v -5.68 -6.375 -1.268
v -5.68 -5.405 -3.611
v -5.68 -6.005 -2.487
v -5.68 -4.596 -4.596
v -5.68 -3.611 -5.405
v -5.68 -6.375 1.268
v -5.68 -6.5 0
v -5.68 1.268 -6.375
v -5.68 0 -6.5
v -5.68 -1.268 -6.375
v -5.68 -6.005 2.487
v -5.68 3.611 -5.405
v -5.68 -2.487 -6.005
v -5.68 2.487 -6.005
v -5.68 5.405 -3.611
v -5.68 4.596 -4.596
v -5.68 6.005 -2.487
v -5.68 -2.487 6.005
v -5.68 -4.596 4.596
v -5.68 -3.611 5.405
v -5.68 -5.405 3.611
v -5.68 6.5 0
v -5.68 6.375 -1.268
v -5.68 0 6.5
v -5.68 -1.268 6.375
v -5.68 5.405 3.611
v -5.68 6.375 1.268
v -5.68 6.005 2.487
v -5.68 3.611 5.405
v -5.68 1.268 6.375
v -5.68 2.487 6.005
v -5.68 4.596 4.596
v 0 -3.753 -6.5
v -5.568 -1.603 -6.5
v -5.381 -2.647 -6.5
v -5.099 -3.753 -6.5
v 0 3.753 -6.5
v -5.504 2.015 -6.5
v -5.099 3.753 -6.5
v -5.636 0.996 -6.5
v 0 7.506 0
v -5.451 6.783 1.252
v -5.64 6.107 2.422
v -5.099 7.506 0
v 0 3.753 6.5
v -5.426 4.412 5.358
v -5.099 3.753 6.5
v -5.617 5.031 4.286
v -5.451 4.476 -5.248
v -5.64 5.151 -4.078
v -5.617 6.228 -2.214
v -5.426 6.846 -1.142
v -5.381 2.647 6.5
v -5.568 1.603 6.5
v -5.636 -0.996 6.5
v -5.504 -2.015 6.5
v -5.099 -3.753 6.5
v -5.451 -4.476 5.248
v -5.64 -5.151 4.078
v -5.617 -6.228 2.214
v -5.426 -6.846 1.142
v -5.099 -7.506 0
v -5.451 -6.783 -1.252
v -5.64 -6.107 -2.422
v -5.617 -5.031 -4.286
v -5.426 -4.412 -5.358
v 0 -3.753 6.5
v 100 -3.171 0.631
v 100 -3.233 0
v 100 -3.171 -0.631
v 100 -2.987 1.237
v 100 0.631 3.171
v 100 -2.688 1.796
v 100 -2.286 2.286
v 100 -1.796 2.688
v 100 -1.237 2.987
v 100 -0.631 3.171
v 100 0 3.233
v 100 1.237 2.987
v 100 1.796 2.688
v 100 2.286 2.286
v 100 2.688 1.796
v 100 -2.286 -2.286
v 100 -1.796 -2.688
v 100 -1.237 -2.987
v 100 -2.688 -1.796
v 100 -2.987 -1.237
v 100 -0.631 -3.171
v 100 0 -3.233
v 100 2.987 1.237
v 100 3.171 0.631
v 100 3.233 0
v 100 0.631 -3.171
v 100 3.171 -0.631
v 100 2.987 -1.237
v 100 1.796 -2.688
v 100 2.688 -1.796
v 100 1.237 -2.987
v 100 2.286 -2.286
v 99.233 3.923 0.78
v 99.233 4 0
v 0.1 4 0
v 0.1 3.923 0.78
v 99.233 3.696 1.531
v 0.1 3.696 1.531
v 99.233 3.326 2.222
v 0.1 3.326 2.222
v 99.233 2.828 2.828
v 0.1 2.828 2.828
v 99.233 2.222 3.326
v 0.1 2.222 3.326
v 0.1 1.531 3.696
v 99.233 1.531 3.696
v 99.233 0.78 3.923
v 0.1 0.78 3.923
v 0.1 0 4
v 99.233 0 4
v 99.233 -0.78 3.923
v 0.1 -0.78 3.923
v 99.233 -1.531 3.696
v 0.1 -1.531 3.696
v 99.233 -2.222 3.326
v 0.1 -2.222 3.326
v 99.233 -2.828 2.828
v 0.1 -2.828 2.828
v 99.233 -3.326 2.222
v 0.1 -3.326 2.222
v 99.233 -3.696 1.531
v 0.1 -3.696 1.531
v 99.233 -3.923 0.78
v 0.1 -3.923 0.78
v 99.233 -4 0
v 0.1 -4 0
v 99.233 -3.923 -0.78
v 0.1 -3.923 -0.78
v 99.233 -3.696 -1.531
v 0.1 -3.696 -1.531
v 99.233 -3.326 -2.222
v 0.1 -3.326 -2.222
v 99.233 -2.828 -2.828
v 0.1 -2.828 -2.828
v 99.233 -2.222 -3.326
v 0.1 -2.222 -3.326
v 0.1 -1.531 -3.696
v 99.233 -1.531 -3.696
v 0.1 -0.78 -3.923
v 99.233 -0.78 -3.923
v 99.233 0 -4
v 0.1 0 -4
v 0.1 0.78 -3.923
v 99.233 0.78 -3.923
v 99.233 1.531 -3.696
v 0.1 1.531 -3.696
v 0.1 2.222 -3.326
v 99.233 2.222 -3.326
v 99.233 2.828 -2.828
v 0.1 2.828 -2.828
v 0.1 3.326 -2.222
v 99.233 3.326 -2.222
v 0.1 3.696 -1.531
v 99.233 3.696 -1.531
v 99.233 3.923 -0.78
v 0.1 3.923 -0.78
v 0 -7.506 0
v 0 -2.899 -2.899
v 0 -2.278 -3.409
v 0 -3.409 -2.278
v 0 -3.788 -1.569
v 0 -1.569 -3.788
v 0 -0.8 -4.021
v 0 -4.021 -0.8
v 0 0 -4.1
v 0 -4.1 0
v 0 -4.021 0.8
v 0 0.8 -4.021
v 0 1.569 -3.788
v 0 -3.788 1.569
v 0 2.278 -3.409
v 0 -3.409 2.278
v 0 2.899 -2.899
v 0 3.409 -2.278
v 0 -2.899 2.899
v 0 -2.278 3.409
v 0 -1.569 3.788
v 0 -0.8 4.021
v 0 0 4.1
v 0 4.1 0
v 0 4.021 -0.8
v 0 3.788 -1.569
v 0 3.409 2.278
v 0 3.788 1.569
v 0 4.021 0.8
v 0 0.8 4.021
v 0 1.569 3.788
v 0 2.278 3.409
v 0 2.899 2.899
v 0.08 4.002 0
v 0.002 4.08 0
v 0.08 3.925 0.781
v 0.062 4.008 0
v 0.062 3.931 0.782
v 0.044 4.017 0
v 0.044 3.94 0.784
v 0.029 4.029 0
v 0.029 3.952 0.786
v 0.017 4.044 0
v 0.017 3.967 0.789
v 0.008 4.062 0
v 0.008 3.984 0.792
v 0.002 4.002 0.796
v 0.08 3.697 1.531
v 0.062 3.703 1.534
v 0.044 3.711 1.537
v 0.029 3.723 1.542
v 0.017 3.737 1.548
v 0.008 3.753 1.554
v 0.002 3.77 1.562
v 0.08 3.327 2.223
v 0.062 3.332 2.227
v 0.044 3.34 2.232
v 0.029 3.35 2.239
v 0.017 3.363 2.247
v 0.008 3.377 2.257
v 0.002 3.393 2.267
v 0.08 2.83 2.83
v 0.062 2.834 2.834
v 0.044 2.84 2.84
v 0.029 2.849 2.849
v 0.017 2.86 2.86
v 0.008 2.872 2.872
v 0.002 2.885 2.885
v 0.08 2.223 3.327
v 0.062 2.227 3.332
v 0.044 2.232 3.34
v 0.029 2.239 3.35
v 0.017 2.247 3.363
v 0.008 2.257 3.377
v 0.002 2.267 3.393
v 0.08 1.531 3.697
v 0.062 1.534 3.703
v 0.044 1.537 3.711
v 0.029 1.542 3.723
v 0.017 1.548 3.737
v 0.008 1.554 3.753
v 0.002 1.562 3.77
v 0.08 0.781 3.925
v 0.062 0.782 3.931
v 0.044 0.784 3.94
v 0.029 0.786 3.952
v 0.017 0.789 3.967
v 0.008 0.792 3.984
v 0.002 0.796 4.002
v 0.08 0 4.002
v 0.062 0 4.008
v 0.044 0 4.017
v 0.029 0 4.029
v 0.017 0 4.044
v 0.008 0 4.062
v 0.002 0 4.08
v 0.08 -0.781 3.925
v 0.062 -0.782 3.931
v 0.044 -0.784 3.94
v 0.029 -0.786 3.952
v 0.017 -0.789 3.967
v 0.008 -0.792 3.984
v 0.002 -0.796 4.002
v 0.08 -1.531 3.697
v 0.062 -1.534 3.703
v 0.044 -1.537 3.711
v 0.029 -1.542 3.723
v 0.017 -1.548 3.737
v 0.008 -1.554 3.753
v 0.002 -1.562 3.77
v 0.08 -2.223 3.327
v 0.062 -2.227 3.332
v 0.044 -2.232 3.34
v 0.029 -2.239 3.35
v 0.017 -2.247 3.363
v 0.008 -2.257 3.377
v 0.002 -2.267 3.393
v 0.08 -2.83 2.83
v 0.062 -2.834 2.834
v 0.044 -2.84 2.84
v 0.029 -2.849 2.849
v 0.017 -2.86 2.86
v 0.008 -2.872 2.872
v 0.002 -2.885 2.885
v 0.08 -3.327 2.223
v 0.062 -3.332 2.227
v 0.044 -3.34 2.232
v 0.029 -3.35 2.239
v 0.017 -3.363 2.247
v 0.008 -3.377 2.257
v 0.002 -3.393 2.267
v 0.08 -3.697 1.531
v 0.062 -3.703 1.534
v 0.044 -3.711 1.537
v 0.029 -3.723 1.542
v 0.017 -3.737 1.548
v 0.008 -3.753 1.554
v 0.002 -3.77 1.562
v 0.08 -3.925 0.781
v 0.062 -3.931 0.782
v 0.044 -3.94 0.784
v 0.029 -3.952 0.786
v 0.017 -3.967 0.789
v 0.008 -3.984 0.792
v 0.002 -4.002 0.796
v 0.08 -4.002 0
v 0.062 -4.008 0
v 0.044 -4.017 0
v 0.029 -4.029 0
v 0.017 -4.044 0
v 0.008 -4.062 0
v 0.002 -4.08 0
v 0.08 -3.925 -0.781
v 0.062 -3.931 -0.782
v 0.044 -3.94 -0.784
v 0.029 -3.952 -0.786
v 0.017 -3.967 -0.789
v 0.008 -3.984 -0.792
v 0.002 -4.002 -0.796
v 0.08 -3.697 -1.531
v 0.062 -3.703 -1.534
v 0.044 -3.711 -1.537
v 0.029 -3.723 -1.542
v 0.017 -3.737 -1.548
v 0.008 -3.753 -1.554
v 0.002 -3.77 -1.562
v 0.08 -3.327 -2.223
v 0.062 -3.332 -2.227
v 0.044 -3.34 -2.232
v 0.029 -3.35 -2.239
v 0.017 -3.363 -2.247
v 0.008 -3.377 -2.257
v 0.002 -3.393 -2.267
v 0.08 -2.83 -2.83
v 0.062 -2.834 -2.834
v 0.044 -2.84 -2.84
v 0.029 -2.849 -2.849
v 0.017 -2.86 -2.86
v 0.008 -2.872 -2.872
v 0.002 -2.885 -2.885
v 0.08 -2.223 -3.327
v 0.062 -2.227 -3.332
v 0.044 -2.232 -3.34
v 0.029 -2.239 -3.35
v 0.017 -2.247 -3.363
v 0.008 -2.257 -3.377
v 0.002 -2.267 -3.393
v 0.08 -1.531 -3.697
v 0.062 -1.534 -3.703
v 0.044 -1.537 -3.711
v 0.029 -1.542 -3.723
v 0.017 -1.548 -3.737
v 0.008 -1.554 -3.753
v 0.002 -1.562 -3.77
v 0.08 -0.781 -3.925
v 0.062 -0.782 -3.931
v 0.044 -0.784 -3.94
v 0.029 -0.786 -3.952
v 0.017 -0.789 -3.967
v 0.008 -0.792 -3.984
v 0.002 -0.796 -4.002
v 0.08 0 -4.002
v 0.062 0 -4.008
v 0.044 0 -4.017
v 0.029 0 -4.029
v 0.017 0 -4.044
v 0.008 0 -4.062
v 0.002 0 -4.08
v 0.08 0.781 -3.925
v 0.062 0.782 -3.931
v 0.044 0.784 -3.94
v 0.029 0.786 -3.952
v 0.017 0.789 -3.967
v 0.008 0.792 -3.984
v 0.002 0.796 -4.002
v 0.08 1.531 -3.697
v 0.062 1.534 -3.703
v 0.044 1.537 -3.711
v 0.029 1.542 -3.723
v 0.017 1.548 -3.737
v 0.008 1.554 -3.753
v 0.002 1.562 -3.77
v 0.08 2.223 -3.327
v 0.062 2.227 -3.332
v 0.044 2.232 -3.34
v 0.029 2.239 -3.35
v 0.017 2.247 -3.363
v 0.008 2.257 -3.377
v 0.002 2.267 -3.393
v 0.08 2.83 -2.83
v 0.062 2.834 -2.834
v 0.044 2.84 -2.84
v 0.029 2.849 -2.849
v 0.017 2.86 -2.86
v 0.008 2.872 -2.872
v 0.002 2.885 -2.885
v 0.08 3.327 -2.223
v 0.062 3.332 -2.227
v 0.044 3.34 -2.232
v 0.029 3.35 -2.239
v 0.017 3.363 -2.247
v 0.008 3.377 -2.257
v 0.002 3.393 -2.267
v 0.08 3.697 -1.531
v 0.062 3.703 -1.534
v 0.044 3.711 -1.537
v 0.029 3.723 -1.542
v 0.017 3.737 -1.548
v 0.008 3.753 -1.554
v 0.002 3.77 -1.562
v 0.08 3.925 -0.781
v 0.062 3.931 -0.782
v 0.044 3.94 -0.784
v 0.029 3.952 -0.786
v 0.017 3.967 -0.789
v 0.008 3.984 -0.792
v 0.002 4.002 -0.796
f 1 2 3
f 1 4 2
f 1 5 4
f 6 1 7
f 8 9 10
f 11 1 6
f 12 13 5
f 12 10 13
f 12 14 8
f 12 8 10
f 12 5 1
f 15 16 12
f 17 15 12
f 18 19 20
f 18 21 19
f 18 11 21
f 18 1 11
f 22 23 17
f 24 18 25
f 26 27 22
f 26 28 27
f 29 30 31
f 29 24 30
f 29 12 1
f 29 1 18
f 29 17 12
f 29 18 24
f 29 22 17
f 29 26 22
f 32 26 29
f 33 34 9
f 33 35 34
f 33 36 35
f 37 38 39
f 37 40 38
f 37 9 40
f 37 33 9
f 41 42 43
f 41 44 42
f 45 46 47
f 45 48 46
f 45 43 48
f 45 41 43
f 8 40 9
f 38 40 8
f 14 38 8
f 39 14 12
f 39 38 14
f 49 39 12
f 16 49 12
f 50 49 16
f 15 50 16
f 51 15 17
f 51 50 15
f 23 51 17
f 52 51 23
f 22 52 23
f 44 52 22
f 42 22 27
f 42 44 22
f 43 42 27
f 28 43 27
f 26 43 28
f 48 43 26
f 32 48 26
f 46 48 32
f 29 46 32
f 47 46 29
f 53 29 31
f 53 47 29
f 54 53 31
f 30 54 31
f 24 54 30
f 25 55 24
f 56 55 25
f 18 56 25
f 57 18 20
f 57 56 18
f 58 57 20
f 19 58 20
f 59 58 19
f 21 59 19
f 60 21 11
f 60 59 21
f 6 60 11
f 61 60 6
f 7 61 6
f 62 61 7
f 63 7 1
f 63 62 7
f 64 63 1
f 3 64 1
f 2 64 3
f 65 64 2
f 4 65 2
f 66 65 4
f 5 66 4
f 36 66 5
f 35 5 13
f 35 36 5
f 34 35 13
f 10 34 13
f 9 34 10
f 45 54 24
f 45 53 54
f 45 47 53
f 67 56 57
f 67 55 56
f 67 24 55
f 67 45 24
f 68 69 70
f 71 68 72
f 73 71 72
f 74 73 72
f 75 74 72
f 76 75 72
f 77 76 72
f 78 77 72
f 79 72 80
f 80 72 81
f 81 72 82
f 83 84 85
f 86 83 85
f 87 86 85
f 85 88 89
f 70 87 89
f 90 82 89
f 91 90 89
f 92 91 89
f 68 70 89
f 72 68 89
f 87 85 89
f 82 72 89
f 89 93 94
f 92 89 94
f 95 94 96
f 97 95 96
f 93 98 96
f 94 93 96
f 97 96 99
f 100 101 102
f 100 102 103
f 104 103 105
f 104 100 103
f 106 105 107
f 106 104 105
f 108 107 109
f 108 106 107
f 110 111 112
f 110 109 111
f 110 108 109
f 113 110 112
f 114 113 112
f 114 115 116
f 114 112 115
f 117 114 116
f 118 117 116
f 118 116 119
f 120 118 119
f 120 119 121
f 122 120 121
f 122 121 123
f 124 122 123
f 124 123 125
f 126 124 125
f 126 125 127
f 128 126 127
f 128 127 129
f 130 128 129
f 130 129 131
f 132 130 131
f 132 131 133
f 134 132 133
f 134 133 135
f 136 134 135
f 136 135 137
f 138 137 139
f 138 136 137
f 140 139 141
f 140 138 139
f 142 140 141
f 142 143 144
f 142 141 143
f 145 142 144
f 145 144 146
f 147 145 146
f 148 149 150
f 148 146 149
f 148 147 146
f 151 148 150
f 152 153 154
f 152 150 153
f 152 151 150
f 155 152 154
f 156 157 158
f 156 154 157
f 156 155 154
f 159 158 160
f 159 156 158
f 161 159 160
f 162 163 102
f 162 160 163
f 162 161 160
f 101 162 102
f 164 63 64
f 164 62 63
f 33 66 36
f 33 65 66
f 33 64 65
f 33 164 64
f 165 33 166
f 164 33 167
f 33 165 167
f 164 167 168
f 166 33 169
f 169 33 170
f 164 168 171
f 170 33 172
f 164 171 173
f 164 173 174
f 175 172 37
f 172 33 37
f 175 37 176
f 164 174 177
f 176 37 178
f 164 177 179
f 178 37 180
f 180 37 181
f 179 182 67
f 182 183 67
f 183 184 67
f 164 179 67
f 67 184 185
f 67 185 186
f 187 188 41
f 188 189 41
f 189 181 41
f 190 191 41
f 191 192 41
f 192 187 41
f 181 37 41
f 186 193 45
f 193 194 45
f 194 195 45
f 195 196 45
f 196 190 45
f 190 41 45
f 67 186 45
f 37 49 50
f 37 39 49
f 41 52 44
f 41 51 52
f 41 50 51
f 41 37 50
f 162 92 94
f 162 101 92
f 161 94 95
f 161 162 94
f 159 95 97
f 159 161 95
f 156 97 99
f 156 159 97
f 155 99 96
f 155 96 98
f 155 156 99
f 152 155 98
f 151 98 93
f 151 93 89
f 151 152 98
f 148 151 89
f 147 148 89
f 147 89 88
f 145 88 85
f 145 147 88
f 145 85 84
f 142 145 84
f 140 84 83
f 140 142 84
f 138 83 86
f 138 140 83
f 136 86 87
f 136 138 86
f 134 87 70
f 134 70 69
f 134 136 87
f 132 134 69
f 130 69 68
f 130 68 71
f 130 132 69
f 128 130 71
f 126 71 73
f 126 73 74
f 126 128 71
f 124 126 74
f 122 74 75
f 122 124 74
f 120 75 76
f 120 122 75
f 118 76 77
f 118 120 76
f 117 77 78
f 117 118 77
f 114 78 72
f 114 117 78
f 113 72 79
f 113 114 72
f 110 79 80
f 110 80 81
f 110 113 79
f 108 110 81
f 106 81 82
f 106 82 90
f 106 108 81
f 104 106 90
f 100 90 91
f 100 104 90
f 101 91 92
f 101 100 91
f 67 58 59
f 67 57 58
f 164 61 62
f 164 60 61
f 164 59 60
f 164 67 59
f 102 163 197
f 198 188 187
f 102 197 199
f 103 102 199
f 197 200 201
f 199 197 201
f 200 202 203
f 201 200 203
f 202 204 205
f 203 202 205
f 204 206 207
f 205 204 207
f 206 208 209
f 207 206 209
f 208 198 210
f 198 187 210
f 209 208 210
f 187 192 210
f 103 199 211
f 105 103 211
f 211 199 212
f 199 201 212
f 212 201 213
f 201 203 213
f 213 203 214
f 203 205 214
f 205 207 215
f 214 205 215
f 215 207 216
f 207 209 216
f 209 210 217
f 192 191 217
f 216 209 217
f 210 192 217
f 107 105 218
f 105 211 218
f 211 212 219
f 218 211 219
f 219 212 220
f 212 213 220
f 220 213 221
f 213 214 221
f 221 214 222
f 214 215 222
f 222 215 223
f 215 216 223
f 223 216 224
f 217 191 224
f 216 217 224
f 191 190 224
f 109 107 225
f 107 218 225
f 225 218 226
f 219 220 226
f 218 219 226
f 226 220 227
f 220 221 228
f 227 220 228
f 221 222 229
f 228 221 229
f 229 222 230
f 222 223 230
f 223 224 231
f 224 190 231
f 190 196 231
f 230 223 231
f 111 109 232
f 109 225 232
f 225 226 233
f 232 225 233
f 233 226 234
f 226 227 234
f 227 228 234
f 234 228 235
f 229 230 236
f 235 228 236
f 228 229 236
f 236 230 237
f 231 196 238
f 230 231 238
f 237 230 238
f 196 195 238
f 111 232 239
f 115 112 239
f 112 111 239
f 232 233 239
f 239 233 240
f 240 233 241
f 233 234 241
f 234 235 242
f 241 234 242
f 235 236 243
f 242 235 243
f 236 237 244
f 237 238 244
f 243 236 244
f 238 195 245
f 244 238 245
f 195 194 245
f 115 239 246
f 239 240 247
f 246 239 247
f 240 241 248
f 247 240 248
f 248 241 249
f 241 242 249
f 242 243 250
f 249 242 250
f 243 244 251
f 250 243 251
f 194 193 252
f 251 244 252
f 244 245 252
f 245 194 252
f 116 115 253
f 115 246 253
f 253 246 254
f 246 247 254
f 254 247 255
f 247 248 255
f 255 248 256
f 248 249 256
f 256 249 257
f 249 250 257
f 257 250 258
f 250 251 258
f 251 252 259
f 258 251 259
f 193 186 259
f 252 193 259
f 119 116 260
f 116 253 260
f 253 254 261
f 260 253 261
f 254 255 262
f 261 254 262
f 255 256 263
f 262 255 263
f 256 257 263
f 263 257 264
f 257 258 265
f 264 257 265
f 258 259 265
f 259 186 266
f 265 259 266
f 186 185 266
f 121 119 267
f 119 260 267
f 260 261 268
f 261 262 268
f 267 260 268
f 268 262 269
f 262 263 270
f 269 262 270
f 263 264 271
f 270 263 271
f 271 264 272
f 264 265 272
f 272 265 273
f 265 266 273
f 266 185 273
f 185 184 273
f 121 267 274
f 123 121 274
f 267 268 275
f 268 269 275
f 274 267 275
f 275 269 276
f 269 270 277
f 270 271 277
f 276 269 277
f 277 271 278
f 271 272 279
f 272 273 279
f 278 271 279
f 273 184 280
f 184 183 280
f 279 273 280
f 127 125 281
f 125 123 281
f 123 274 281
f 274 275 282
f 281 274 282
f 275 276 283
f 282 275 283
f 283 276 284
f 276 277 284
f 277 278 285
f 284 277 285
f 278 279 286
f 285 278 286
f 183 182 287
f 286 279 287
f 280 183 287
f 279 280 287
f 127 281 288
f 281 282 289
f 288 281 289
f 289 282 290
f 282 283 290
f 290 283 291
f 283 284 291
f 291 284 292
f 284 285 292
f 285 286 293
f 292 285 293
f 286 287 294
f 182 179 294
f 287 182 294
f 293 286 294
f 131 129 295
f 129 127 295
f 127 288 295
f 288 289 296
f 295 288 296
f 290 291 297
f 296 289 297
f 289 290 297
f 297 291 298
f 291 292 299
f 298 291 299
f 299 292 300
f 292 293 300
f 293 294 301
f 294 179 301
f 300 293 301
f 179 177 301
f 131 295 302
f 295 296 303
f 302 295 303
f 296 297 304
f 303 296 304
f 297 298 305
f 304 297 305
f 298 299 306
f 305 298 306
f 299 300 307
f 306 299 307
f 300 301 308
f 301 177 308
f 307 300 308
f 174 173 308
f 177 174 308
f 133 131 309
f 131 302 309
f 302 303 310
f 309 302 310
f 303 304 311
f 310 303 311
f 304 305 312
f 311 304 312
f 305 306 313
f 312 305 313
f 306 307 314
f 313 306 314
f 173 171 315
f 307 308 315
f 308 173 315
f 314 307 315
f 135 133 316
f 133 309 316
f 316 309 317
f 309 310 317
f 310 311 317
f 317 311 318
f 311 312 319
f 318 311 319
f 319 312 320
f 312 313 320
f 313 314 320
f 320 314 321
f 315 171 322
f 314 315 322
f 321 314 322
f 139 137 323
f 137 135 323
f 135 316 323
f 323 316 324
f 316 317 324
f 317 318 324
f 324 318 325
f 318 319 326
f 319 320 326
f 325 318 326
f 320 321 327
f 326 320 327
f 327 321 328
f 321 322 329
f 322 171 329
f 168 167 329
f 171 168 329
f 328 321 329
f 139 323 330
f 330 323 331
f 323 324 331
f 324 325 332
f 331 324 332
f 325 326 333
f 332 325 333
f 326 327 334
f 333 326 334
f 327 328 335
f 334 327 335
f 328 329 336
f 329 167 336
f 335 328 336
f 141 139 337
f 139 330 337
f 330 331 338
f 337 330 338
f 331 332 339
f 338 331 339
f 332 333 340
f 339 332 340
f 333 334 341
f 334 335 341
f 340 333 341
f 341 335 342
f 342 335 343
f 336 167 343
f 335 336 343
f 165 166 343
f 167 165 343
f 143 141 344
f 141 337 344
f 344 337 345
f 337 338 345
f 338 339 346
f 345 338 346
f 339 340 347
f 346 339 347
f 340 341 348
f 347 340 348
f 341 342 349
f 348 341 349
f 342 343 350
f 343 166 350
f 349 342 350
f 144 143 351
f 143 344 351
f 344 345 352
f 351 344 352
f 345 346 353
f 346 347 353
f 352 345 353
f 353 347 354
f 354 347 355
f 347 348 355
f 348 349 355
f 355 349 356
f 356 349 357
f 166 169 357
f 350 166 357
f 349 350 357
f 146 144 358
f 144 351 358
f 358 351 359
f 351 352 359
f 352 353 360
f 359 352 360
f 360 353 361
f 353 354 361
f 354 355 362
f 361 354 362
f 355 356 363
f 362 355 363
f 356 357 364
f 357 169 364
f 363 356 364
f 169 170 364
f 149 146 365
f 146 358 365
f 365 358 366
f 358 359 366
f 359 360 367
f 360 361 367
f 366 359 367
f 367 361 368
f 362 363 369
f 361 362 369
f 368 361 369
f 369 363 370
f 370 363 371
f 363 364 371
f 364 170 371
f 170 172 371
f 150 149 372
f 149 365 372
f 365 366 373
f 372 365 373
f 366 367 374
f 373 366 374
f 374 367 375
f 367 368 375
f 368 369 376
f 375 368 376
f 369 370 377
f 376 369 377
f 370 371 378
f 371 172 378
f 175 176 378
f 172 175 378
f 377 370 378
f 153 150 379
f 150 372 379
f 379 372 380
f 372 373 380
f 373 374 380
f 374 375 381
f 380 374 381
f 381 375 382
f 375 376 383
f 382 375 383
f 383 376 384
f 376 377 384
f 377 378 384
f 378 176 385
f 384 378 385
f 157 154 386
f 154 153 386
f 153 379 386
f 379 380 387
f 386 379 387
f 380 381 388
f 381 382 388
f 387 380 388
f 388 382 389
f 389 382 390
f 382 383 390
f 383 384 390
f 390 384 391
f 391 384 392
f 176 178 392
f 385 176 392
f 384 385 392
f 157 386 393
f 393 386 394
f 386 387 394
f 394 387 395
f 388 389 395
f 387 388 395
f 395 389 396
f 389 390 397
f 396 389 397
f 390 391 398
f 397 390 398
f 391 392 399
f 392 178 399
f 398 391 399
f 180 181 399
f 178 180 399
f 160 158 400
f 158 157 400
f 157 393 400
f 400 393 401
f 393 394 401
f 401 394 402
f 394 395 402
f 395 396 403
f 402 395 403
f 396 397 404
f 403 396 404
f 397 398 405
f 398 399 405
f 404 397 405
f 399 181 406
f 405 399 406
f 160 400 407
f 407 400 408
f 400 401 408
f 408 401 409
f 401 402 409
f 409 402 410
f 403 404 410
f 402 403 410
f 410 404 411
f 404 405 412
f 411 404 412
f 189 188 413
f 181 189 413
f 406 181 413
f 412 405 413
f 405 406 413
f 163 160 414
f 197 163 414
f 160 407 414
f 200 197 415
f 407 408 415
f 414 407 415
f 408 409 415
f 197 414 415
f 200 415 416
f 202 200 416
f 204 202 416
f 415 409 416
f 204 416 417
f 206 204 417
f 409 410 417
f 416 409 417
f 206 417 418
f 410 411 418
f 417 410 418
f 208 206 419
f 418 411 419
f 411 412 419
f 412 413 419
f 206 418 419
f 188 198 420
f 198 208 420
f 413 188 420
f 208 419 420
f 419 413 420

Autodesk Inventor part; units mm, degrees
ref_plane "YZ Plane" through (0, 0, 0) normal (1, 0, 0) x (0, 1, 0)
ref_plane "XZ Plane" through (0, 0, 0) normal (0, 1, 0) x (-1, 0, 0)
sketch "Sketch1" plane through (0, 0, 0) normal (0, 0, 1) x (1, 0, 0)
  line L0 (0, 4) -> (100, 4)
  line L1 (100, 4) -> (100, 0)
  line L2 (100, 0) -> (0, 0)
  line L3 (-16, 0) -> (96, 0) projected
  line L4 (0, -0.8) -> (0, 4.8) projected
  line L5 (0, 4) -> (0, 0)
  dimension "d2" = 8
  dimension "d59" = 100
revolve "Body" add sketch "Sketch1" angle 360 about axis through (100, 0, 0) along (-1, 0, 0)
sketch "Sketch2" plane through (0, 0, 0) normal (-1, 0, 0) x (0, 0, 1)
  line L0 (0, 7.5056) -> (6.5, 3.7528)
  line L1 (6.5, 3.7528) -> (6.5, -3.7528)
  line L2 (6.5, -3.7528) -> (0, -7.5056)
  line L3 (0, -7.5056) -> (-6.5, -3.7528)
  line L4 (-6.5, -3.7528) -> (-6.5, 3.7528)
  line L5 (-6.5, 3.7528) -> (0, 7.5056)
  line L6 (-9.1, 0) -> (9.1, 0) projected
  line L7 (0, 10.5078) -> (0, -10.5078) projected
  point P0 (0, 0)
  point P1 (0, 0)
  dimension "d11" = 13
extrude "Head" add sketch "Sketch2" along normal blind 5.68
sketch "Sketch4" plane through (0, 0, 0) normal (0, 0, 1) x (1, 0, 0)
  line L0 (-4.9294, 7.8) -> (-5.68, 6.5)
  line L1 (-1.1, 0) -> (-0.234, 0)
  line L2 (-6.7692, 0) -> (0.8552, 0) projected
  line L3 (-5.68, 7.8) -> (-4.9294, 7.8)
  line L4 (-5.68, 6.5) -> (-5.68, 7.8)
  line L5 (0, 9.36) -> (0, -1.56) projected
  dimension "d65" = 13
  dimension "d67" = 30
  dimension "d68" = 15.6
  dimension "d69" = 5.68
revolve "Chamfer1" cut sketch "Sketch4" angle 360 about axis through (-1.1, 0, 0) along (1, 0, 0)
thread "Thread" size "M8x1.25" class "6g" standard "ISO Metric profile" length 22
chamfer "Chamfer2" distance 0.7668 distance2 0.7669 1 edges at (100, -4, 0) measured on face at (100, -1.054, 1.6624)
fillet "Fillet" radius 0.1 1 edges at (0, -4, 0)
ref_plane "Work Plane1" through (1.525, 0, 0) normal (0, 0, 1) x (1, 0, 0)
equation "\"d2\" = GD"
equation "\"d59\" = NLG"
equation "\"d11\" = SW"
equation "\"d3\" = KOH"
equation "\"d15\" = GEL"
equation "\"d6\" = -0.5 * SPD + 0.5 * GD"
equation "\"d71\" = RR"
equation "\"d65\" = SW"
equation "\"d67\" = ANG1"
equation "\"d68\" = 1.2 * SW"
equation "\"d69\" = KOH"
equation "\"NLG\" = 100"
equation "\"GD\" = NND"
equation "\"BDM\" = NND"
equation "\"KOH\" = 5.68"
equation "\"GEL\" = 22"
equation "\"SW\" = 13"
equation "\"SW0\" = SW"
equation "\"SPD\" = NND - 1.2269 * PTC"
equation "\"SD2\" = NND"
equation "\"SD\" = 0"
equation "\"ANG1\" = 30deg"
equation "\"GAL\" = 0.61345 * PTC"
equation "\"GUL\" = 0.61345 * PTC"
equation "\"RR\" = 0.1"
equation "\"RR1\" = 0.4"
equation "\"GD1\" = THREADDIA - 1.2269 * PTC"
equation "\"THREADDIA\" = 8"
equation "\"TOA\" = 30deg"
equation "\"PTC\" = 1.25"
equation "\"KOH1\" = 3.7"
equation "\"NND\" = 8"
equation "\"E0\" = 1.155 * SW"
properties material "Steel, Mild"
